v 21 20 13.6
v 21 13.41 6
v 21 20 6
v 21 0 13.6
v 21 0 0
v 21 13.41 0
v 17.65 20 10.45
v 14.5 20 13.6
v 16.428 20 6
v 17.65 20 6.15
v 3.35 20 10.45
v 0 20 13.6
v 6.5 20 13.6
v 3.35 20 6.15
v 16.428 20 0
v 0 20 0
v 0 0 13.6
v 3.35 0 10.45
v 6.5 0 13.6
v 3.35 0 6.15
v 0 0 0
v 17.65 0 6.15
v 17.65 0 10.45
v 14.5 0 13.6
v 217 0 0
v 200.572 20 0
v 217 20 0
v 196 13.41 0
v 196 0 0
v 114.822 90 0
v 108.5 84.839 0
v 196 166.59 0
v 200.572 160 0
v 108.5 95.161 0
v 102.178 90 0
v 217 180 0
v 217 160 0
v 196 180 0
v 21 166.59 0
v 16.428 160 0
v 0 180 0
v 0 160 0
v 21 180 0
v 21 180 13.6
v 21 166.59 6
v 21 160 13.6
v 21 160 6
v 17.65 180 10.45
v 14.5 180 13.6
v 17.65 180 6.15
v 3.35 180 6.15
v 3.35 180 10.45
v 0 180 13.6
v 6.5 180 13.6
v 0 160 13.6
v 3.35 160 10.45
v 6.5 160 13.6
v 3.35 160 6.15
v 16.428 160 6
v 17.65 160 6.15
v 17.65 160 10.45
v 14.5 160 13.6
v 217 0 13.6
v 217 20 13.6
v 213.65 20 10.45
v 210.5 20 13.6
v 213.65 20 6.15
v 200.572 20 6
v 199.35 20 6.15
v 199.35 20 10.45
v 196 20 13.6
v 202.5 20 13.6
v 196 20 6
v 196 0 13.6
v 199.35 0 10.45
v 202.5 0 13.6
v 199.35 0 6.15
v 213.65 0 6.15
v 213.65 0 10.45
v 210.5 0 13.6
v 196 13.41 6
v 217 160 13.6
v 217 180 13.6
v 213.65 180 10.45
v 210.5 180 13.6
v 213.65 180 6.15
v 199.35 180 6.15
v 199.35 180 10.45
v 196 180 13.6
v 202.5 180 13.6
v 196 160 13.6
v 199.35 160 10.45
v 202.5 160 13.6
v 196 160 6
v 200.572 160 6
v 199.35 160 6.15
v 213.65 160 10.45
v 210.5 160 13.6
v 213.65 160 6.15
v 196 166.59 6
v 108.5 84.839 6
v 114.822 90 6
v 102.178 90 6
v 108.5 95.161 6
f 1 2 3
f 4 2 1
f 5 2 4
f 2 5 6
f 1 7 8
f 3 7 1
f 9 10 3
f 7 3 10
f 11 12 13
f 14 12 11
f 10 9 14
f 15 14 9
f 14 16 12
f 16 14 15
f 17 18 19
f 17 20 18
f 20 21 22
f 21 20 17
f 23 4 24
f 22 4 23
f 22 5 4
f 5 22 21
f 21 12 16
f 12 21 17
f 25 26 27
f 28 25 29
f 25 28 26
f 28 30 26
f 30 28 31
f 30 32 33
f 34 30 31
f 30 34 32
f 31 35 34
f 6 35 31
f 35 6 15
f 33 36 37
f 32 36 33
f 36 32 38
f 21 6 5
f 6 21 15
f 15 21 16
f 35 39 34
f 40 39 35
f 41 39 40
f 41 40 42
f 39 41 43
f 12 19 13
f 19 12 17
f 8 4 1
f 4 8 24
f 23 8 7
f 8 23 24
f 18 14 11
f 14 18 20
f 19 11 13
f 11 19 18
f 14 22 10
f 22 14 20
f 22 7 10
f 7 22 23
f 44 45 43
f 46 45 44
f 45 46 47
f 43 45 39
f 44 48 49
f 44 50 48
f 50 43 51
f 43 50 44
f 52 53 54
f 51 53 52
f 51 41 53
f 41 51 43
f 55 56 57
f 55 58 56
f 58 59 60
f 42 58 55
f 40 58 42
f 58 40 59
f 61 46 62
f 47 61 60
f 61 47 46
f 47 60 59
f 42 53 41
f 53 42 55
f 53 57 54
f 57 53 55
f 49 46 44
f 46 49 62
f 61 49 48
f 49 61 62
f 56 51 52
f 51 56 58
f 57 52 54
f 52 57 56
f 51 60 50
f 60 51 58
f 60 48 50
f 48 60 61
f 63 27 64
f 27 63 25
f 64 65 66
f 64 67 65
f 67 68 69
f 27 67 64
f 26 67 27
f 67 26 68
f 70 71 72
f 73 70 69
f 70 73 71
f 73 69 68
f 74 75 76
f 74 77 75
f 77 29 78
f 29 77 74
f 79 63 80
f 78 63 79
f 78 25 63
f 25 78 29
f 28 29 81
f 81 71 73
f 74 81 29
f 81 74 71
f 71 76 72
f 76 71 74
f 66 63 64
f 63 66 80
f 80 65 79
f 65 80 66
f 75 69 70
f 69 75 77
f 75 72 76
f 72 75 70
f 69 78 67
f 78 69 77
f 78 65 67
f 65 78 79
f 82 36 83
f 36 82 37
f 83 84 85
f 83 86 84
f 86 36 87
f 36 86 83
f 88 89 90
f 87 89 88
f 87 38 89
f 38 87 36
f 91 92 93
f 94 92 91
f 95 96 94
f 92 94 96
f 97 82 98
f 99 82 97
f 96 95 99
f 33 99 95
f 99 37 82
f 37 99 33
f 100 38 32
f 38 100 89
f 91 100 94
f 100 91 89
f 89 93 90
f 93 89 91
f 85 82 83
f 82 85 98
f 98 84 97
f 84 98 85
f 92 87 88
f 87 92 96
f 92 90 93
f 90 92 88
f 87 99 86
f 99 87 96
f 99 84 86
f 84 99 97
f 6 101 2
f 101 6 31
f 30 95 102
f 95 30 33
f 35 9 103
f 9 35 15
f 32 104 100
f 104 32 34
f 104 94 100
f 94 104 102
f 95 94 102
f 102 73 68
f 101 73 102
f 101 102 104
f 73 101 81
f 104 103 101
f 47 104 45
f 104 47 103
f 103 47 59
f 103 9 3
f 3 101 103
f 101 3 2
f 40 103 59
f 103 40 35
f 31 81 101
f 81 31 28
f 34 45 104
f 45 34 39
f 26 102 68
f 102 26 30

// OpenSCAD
// Full rear bracket V2: tested 0p15 channels. Existing supports/top unchanged.
// clearance is per axis-aligned face; diagonal normal gap = sqrt(2)*clearance.
clearance=0.15;
assert(clearance>=.1 && clearance<=.3);
module box(a,b){translate(a)cube(b-a);}
module channel(){difference(){
 box([-10.5,.7,0],[10.5,14.3,20]);
 translate([0,0,-.1])linear_extrude(20.2)polygon([
 [-7-clearance,8+clearance],[7+clearance,8+clearance],
 [7+clearance,4-clearance],[3.5+clearance,.5-clearance],
 [-3.5-clearance,.5-clearance],[-7-clearance,4-clearance]]);
 box([-3.5-clearance,.6,-.1],[3.5+clearance,4-clearance+.1,20.1]);
}}

$fn=48;
module brace_world(){union(){
 for(x=[25.5,221.5])for(z=[30,190])translate([x,160,z])channel();
 for(pair=[[[25.5,40],[221.5,200]],[[25.5,200],[221.5,40]]])
 hull()for(p=pair)translate([p[0],168.3,p[1]])rotate([-90,0,0])cylinder(d=8,h=6);
}}
// Flat rear face on bed, channels upward. Millimetres.
multmatrix([[1,0,0,-15],[0,0,1,-30],[0,-1,0,174.3],[0,0,0,1]])brace_world();
